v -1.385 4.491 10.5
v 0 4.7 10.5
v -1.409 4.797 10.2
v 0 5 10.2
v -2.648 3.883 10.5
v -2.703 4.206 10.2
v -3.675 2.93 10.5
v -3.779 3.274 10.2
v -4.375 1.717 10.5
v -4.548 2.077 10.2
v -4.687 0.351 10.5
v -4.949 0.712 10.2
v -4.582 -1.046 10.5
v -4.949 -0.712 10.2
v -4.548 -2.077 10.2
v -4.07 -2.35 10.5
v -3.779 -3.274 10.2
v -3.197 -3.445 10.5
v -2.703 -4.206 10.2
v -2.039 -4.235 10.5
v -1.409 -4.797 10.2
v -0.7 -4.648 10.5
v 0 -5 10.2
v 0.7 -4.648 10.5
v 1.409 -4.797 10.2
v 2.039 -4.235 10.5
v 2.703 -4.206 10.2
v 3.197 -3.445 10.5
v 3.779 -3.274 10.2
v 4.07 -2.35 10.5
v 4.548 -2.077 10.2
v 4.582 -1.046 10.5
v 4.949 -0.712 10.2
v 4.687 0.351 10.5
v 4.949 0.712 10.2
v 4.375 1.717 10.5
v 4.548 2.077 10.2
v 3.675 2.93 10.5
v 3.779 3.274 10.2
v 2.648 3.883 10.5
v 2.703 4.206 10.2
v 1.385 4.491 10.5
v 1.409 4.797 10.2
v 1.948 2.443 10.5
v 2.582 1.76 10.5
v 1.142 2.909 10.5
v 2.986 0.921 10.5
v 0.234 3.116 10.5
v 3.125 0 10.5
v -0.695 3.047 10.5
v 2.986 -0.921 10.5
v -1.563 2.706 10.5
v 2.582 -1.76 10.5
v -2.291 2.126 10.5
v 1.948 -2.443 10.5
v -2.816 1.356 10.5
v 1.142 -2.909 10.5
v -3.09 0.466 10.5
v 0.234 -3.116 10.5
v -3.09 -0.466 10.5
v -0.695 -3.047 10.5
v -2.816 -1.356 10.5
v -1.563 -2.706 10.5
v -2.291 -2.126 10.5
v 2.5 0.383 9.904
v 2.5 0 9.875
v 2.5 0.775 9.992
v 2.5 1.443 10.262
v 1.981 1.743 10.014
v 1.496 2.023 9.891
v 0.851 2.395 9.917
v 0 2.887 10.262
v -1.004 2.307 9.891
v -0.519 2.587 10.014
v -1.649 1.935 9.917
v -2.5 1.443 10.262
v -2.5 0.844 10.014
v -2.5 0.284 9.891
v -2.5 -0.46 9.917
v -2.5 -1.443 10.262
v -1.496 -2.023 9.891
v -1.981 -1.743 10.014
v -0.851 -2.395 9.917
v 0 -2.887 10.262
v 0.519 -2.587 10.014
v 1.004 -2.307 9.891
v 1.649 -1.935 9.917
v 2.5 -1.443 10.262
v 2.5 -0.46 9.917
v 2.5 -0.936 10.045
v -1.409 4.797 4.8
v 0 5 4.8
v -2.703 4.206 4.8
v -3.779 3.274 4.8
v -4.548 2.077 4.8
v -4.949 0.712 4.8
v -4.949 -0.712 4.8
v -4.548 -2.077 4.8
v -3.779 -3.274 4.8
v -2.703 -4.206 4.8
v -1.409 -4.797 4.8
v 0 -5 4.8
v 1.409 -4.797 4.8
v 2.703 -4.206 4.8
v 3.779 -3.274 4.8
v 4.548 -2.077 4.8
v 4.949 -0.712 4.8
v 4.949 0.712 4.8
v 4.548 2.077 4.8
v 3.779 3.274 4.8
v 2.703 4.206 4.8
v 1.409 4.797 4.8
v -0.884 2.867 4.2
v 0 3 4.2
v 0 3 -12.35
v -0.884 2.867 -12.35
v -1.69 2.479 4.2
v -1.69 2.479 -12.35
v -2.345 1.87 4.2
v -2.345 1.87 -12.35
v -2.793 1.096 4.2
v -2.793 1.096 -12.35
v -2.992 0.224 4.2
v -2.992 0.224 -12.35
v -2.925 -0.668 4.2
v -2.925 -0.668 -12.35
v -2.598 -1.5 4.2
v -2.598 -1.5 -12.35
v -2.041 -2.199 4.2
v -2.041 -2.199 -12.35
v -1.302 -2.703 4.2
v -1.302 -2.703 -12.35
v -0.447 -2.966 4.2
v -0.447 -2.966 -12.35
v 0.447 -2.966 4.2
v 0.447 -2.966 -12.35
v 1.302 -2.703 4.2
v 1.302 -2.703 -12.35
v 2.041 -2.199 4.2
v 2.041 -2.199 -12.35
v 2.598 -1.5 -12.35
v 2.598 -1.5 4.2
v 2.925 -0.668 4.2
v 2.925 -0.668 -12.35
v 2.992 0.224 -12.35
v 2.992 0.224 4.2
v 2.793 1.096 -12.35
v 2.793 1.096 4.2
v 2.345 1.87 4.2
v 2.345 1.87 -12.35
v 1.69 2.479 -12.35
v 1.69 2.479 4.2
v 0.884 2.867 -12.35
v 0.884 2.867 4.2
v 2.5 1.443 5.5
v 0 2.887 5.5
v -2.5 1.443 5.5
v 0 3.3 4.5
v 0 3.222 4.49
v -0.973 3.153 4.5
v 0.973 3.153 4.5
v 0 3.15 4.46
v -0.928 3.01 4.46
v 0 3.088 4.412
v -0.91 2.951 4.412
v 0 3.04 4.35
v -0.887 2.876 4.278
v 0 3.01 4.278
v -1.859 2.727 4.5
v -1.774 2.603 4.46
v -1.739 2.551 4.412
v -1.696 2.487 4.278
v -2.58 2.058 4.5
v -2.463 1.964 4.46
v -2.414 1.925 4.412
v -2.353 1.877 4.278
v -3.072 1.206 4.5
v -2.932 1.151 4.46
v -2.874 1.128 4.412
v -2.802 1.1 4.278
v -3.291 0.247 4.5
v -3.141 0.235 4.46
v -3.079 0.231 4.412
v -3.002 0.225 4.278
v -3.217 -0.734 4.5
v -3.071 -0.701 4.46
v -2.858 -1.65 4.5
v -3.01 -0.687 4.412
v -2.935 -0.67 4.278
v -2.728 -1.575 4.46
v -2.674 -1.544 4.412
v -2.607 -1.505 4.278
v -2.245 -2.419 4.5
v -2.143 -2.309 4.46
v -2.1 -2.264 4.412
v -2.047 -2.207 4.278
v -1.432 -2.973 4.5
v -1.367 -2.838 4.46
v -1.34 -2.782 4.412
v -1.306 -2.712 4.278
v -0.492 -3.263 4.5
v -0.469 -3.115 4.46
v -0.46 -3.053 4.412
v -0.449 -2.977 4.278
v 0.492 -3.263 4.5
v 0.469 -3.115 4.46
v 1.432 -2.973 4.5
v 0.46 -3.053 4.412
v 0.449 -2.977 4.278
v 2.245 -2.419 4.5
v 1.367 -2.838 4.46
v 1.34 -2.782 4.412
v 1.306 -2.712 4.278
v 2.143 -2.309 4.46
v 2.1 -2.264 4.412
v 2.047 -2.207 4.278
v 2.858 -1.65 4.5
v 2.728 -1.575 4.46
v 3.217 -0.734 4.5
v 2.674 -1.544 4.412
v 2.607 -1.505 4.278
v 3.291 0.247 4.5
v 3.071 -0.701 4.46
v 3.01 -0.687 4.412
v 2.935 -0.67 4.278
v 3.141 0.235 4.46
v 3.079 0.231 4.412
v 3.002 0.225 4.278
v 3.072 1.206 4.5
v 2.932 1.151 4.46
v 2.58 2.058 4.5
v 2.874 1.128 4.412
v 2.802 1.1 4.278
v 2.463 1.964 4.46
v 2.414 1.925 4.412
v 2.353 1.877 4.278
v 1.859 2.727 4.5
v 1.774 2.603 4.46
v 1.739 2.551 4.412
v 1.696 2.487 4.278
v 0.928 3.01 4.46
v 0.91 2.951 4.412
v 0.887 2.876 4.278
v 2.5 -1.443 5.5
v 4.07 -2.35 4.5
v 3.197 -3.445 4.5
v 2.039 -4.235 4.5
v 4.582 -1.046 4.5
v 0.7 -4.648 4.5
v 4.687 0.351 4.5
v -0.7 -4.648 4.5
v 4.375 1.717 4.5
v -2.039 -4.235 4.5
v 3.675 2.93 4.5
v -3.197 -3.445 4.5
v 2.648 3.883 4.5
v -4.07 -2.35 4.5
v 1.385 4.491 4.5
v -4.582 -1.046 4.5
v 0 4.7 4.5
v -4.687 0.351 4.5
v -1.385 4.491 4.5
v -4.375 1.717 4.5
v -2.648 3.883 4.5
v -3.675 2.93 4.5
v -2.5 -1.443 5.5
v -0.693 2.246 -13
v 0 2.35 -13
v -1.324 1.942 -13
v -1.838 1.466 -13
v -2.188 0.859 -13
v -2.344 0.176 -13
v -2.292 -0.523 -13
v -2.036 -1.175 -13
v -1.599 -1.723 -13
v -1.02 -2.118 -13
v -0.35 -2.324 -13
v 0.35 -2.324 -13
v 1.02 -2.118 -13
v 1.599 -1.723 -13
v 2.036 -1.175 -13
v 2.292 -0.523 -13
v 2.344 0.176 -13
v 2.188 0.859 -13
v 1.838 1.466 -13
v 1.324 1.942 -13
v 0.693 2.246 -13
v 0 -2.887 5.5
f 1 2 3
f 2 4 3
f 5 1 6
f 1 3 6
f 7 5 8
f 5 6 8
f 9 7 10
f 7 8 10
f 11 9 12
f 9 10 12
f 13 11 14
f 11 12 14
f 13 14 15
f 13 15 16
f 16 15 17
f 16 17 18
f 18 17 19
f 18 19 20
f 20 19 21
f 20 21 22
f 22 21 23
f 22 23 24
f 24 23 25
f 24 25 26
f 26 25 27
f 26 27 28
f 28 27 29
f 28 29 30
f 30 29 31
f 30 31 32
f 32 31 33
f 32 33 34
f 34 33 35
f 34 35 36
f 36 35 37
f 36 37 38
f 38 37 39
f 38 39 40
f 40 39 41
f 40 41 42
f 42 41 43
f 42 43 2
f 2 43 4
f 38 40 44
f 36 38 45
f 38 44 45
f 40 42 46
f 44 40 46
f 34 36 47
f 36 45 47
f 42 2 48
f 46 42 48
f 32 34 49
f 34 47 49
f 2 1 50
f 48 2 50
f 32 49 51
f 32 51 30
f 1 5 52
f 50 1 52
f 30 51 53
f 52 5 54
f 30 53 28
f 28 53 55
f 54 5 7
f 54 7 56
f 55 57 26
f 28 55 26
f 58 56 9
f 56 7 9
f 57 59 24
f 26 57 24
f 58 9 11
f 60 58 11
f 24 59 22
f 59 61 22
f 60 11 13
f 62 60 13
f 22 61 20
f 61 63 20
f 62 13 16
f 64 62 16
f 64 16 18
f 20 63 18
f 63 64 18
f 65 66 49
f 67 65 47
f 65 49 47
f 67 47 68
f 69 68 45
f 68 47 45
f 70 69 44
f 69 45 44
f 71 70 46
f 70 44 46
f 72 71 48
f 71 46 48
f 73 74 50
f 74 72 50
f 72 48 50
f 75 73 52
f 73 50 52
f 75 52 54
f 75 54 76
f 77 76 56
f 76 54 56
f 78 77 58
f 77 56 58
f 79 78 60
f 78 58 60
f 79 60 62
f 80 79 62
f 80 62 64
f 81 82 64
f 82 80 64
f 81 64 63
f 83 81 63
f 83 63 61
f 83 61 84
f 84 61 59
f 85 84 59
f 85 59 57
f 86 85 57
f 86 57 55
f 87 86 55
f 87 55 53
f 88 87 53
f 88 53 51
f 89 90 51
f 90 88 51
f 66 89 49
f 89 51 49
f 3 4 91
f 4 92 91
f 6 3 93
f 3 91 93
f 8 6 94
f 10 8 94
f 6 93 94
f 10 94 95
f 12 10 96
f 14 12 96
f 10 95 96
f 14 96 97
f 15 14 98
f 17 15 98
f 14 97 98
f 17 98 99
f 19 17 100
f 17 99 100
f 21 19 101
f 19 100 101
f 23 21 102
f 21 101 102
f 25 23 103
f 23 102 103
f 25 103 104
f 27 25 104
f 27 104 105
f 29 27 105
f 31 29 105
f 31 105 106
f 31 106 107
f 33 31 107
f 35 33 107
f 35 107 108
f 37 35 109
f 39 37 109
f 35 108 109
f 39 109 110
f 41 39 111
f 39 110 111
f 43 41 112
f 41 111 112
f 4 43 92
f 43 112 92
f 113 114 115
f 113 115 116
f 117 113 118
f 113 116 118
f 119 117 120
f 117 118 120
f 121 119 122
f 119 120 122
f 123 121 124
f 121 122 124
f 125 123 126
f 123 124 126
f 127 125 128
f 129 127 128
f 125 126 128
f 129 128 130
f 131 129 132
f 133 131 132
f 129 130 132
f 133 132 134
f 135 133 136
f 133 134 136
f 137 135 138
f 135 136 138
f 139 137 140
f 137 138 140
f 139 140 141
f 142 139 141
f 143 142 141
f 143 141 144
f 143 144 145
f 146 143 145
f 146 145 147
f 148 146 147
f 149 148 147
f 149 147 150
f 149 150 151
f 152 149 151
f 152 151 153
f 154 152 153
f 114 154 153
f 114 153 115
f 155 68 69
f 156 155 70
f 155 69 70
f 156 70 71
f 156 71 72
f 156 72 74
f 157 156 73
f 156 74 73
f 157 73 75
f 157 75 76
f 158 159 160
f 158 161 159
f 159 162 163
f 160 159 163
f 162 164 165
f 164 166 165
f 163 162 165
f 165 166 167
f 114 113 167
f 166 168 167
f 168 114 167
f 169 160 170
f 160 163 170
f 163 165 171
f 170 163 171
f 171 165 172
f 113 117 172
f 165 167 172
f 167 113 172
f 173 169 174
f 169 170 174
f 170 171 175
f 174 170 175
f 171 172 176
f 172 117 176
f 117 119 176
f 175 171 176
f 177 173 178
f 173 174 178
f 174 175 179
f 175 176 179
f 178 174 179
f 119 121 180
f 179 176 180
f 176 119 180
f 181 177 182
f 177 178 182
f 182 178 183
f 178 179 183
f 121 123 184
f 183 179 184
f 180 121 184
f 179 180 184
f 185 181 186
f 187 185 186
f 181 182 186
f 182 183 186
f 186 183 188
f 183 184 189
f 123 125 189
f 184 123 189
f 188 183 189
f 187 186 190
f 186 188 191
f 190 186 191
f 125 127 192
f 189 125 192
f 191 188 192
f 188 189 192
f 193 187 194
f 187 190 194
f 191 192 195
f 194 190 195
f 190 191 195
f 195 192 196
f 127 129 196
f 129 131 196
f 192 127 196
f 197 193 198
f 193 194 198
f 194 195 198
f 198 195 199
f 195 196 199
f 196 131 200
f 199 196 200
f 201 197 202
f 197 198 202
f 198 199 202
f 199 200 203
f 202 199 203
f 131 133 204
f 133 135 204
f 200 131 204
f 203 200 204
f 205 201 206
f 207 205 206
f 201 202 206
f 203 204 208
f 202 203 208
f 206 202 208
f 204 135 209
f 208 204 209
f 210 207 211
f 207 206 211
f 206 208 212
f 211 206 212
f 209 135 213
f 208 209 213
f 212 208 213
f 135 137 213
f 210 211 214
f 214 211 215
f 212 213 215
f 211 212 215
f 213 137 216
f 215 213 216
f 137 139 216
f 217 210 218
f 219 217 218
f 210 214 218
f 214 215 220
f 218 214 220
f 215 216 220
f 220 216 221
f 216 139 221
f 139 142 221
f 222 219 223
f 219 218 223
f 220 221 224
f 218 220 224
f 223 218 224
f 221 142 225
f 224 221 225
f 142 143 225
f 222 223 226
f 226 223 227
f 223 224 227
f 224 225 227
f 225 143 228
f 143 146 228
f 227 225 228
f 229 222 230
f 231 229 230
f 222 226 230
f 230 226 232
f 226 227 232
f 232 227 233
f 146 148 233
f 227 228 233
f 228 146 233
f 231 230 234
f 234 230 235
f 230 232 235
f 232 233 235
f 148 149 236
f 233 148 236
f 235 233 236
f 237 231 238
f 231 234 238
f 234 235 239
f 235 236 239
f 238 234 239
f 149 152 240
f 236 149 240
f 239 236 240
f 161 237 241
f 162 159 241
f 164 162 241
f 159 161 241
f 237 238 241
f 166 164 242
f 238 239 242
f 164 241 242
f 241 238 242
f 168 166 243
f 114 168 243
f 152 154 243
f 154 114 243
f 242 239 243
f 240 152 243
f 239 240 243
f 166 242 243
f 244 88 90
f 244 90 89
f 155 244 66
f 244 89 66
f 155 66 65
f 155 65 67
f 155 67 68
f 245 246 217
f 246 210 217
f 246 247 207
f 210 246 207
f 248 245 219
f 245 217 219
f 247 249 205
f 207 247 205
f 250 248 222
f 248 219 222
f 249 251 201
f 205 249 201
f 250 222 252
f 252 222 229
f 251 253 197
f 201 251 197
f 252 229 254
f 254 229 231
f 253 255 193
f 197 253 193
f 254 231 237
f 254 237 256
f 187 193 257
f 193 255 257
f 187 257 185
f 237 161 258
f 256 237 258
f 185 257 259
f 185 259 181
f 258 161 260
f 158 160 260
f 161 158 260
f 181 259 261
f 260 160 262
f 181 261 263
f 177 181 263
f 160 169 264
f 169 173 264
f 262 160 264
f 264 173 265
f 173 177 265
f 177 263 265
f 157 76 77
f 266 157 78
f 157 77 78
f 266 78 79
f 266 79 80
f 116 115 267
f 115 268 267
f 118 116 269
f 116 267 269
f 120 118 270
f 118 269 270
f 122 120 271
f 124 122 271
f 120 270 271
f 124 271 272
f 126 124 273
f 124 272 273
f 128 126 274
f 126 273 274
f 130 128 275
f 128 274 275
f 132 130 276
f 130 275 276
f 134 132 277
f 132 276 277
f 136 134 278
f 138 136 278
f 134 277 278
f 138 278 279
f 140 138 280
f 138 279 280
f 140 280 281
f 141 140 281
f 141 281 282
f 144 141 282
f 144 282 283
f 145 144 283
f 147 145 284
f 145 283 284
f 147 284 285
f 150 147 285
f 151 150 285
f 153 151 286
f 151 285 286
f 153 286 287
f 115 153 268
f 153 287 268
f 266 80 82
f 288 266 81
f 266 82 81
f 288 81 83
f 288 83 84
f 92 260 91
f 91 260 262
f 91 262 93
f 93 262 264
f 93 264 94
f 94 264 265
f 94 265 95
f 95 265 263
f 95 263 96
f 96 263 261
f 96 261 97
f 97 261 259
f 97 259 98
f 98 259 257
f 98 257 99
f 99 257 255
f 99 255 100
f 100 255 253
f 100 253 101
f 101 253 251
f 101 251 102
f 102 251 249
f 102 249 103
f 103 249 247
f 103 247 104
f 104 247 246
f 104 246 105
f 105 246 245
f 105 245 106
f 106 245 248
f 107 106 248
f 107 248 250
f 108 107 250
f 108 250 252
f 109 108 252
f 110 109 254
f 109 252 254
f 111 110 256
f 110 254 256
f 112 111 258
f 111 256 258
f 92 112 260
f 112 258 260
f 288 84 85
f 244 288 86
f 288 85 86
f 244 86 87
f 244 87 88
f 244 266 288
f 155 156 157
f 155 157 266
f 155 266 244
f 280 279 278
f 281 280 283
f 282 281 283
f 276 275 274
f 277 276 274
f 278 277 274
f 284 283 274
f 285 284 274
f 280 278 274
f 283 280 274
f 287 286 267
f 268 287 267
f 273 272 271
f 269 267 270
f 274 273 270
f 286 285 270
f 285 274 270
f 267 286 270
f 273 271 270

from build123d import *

# Parameters (mm, degrees)
CUT_EXTRUDE1_DEPTH  = 5
SKETCH4_R           = 3.125
CUT_EXTRUDE2_DEPTH  = 3
CUT_EXTRUDE2_DRAFT  = -45
SKETCH12_R          = 3
BOSS_EXTRUDE1_DEPTH = 2.5


with BuildPart() as part:
    # Sketch2 → Revolve1 (revolve)
    with BuildSketch(Plane(origin=(0, 0, 0), x_dir=(0, 0, -1), z_dir=(1, 0, 0))):
        with BuildLine():
            Line((-10.5, 0), (-10.5, 4.7))
            Line((-10.5, 4.7), (-10.2, 5))
            Line((-10.2, 5), (-4.8, 5))
            Line((-4.8, 5), (-4.5, 4.7))
            Line((-4.5, 4.7), (-4.5, 3.3))
            ThreePointArc((-4.5, 3.3), (-4.412132034, 3.087867966), (-4.2, 3))
            Line((-4.2, 3), (9.850480947, 3))
            Line((9.850480947, 3), (10.5, 2.350480947))
            Line((10.5, 2.350480947), (10.5, 0))
            Line((10.5, 0), (-10.5, 0))
        make_face()
    revolve(axis=Axis((0, 0, -10.5), (0, 0, 1)))

    # Sketch3 → Cut-Extrude1 (cut)
    with BuildSketch(Plane.XY.offset(10.5)):
        Polygon((2.5, -1.443375673), (2.5, 1.443375673), (0, 2.886751346), (-2.5, 1.443375673), (-2.5, -1.443375673), (0, -2.886751346), align=None)
    extrude(amount=-CUT_EXTRUDE1_DEPTH, mode=Mode.SUBTRACT)


with BuildPart() as cut_extrude2_tool:
    # Sketch4 → Cut-Extrude2 (with draft: the straight prism first)
    with BuildSketch(Plane.XY.offset(10.5)):
        Circle(SKETCH4_R)
    extrude(amount=-CUT_EXTRUDE2_DEPTH)
    # Cut-Extrude2: the draft: its side faces are tilted about the plane it starts from
    cut_extrude2_sides = [cut_extrude2_tool.faces().sort_by_distance(p)[0] for p in [
        (-3.125, 0, 9),
    ]]
    draft(cut_extrude2_sides, Plane.XY.offset(10.5), CUT_EXTRUDE2_DRAFT)


with BuildPart() as part_1:
    add(part.part)

    # Cut-Extrude2: cut by cut_extrude2_tool
    add(cut_extrude2_tool.part, mode=Mode.SUBTRACT)


with BuildPart() as body_2:
    # Split1: the piece on the far side of the plane
    add(part_1.part)
    split(bisect_by=Plane.XY, keep=Keep.BOTTOM)


with BuildPart() as part_2:
    add(part_1.part)

    # Split1
    split(bisect_by=Plane.XY, keep=Keep.TOP)



with BuildPart() as body_2_1:
    # Body-Move/Copy1: moved
    add(body_2.part.moved(Location((0, 0, -2.5))))


with BuildPart() as part_3:
    add(part_2.part)

    add(body_2_1.part)  # Boss-Extrude1 merges body 2
    # Sketch12 → Boss-Extrude1 (add)
    with BuildSketch(Plane.XY.offset(-2.5)):
        with Locations(Location((0, 0, 0), (0, 0, 90))):
            Circle(SKETCH12_R)
    extrude(amount=BOSS_EXTRUDE1_DEPTH)


solid = part_3.part
